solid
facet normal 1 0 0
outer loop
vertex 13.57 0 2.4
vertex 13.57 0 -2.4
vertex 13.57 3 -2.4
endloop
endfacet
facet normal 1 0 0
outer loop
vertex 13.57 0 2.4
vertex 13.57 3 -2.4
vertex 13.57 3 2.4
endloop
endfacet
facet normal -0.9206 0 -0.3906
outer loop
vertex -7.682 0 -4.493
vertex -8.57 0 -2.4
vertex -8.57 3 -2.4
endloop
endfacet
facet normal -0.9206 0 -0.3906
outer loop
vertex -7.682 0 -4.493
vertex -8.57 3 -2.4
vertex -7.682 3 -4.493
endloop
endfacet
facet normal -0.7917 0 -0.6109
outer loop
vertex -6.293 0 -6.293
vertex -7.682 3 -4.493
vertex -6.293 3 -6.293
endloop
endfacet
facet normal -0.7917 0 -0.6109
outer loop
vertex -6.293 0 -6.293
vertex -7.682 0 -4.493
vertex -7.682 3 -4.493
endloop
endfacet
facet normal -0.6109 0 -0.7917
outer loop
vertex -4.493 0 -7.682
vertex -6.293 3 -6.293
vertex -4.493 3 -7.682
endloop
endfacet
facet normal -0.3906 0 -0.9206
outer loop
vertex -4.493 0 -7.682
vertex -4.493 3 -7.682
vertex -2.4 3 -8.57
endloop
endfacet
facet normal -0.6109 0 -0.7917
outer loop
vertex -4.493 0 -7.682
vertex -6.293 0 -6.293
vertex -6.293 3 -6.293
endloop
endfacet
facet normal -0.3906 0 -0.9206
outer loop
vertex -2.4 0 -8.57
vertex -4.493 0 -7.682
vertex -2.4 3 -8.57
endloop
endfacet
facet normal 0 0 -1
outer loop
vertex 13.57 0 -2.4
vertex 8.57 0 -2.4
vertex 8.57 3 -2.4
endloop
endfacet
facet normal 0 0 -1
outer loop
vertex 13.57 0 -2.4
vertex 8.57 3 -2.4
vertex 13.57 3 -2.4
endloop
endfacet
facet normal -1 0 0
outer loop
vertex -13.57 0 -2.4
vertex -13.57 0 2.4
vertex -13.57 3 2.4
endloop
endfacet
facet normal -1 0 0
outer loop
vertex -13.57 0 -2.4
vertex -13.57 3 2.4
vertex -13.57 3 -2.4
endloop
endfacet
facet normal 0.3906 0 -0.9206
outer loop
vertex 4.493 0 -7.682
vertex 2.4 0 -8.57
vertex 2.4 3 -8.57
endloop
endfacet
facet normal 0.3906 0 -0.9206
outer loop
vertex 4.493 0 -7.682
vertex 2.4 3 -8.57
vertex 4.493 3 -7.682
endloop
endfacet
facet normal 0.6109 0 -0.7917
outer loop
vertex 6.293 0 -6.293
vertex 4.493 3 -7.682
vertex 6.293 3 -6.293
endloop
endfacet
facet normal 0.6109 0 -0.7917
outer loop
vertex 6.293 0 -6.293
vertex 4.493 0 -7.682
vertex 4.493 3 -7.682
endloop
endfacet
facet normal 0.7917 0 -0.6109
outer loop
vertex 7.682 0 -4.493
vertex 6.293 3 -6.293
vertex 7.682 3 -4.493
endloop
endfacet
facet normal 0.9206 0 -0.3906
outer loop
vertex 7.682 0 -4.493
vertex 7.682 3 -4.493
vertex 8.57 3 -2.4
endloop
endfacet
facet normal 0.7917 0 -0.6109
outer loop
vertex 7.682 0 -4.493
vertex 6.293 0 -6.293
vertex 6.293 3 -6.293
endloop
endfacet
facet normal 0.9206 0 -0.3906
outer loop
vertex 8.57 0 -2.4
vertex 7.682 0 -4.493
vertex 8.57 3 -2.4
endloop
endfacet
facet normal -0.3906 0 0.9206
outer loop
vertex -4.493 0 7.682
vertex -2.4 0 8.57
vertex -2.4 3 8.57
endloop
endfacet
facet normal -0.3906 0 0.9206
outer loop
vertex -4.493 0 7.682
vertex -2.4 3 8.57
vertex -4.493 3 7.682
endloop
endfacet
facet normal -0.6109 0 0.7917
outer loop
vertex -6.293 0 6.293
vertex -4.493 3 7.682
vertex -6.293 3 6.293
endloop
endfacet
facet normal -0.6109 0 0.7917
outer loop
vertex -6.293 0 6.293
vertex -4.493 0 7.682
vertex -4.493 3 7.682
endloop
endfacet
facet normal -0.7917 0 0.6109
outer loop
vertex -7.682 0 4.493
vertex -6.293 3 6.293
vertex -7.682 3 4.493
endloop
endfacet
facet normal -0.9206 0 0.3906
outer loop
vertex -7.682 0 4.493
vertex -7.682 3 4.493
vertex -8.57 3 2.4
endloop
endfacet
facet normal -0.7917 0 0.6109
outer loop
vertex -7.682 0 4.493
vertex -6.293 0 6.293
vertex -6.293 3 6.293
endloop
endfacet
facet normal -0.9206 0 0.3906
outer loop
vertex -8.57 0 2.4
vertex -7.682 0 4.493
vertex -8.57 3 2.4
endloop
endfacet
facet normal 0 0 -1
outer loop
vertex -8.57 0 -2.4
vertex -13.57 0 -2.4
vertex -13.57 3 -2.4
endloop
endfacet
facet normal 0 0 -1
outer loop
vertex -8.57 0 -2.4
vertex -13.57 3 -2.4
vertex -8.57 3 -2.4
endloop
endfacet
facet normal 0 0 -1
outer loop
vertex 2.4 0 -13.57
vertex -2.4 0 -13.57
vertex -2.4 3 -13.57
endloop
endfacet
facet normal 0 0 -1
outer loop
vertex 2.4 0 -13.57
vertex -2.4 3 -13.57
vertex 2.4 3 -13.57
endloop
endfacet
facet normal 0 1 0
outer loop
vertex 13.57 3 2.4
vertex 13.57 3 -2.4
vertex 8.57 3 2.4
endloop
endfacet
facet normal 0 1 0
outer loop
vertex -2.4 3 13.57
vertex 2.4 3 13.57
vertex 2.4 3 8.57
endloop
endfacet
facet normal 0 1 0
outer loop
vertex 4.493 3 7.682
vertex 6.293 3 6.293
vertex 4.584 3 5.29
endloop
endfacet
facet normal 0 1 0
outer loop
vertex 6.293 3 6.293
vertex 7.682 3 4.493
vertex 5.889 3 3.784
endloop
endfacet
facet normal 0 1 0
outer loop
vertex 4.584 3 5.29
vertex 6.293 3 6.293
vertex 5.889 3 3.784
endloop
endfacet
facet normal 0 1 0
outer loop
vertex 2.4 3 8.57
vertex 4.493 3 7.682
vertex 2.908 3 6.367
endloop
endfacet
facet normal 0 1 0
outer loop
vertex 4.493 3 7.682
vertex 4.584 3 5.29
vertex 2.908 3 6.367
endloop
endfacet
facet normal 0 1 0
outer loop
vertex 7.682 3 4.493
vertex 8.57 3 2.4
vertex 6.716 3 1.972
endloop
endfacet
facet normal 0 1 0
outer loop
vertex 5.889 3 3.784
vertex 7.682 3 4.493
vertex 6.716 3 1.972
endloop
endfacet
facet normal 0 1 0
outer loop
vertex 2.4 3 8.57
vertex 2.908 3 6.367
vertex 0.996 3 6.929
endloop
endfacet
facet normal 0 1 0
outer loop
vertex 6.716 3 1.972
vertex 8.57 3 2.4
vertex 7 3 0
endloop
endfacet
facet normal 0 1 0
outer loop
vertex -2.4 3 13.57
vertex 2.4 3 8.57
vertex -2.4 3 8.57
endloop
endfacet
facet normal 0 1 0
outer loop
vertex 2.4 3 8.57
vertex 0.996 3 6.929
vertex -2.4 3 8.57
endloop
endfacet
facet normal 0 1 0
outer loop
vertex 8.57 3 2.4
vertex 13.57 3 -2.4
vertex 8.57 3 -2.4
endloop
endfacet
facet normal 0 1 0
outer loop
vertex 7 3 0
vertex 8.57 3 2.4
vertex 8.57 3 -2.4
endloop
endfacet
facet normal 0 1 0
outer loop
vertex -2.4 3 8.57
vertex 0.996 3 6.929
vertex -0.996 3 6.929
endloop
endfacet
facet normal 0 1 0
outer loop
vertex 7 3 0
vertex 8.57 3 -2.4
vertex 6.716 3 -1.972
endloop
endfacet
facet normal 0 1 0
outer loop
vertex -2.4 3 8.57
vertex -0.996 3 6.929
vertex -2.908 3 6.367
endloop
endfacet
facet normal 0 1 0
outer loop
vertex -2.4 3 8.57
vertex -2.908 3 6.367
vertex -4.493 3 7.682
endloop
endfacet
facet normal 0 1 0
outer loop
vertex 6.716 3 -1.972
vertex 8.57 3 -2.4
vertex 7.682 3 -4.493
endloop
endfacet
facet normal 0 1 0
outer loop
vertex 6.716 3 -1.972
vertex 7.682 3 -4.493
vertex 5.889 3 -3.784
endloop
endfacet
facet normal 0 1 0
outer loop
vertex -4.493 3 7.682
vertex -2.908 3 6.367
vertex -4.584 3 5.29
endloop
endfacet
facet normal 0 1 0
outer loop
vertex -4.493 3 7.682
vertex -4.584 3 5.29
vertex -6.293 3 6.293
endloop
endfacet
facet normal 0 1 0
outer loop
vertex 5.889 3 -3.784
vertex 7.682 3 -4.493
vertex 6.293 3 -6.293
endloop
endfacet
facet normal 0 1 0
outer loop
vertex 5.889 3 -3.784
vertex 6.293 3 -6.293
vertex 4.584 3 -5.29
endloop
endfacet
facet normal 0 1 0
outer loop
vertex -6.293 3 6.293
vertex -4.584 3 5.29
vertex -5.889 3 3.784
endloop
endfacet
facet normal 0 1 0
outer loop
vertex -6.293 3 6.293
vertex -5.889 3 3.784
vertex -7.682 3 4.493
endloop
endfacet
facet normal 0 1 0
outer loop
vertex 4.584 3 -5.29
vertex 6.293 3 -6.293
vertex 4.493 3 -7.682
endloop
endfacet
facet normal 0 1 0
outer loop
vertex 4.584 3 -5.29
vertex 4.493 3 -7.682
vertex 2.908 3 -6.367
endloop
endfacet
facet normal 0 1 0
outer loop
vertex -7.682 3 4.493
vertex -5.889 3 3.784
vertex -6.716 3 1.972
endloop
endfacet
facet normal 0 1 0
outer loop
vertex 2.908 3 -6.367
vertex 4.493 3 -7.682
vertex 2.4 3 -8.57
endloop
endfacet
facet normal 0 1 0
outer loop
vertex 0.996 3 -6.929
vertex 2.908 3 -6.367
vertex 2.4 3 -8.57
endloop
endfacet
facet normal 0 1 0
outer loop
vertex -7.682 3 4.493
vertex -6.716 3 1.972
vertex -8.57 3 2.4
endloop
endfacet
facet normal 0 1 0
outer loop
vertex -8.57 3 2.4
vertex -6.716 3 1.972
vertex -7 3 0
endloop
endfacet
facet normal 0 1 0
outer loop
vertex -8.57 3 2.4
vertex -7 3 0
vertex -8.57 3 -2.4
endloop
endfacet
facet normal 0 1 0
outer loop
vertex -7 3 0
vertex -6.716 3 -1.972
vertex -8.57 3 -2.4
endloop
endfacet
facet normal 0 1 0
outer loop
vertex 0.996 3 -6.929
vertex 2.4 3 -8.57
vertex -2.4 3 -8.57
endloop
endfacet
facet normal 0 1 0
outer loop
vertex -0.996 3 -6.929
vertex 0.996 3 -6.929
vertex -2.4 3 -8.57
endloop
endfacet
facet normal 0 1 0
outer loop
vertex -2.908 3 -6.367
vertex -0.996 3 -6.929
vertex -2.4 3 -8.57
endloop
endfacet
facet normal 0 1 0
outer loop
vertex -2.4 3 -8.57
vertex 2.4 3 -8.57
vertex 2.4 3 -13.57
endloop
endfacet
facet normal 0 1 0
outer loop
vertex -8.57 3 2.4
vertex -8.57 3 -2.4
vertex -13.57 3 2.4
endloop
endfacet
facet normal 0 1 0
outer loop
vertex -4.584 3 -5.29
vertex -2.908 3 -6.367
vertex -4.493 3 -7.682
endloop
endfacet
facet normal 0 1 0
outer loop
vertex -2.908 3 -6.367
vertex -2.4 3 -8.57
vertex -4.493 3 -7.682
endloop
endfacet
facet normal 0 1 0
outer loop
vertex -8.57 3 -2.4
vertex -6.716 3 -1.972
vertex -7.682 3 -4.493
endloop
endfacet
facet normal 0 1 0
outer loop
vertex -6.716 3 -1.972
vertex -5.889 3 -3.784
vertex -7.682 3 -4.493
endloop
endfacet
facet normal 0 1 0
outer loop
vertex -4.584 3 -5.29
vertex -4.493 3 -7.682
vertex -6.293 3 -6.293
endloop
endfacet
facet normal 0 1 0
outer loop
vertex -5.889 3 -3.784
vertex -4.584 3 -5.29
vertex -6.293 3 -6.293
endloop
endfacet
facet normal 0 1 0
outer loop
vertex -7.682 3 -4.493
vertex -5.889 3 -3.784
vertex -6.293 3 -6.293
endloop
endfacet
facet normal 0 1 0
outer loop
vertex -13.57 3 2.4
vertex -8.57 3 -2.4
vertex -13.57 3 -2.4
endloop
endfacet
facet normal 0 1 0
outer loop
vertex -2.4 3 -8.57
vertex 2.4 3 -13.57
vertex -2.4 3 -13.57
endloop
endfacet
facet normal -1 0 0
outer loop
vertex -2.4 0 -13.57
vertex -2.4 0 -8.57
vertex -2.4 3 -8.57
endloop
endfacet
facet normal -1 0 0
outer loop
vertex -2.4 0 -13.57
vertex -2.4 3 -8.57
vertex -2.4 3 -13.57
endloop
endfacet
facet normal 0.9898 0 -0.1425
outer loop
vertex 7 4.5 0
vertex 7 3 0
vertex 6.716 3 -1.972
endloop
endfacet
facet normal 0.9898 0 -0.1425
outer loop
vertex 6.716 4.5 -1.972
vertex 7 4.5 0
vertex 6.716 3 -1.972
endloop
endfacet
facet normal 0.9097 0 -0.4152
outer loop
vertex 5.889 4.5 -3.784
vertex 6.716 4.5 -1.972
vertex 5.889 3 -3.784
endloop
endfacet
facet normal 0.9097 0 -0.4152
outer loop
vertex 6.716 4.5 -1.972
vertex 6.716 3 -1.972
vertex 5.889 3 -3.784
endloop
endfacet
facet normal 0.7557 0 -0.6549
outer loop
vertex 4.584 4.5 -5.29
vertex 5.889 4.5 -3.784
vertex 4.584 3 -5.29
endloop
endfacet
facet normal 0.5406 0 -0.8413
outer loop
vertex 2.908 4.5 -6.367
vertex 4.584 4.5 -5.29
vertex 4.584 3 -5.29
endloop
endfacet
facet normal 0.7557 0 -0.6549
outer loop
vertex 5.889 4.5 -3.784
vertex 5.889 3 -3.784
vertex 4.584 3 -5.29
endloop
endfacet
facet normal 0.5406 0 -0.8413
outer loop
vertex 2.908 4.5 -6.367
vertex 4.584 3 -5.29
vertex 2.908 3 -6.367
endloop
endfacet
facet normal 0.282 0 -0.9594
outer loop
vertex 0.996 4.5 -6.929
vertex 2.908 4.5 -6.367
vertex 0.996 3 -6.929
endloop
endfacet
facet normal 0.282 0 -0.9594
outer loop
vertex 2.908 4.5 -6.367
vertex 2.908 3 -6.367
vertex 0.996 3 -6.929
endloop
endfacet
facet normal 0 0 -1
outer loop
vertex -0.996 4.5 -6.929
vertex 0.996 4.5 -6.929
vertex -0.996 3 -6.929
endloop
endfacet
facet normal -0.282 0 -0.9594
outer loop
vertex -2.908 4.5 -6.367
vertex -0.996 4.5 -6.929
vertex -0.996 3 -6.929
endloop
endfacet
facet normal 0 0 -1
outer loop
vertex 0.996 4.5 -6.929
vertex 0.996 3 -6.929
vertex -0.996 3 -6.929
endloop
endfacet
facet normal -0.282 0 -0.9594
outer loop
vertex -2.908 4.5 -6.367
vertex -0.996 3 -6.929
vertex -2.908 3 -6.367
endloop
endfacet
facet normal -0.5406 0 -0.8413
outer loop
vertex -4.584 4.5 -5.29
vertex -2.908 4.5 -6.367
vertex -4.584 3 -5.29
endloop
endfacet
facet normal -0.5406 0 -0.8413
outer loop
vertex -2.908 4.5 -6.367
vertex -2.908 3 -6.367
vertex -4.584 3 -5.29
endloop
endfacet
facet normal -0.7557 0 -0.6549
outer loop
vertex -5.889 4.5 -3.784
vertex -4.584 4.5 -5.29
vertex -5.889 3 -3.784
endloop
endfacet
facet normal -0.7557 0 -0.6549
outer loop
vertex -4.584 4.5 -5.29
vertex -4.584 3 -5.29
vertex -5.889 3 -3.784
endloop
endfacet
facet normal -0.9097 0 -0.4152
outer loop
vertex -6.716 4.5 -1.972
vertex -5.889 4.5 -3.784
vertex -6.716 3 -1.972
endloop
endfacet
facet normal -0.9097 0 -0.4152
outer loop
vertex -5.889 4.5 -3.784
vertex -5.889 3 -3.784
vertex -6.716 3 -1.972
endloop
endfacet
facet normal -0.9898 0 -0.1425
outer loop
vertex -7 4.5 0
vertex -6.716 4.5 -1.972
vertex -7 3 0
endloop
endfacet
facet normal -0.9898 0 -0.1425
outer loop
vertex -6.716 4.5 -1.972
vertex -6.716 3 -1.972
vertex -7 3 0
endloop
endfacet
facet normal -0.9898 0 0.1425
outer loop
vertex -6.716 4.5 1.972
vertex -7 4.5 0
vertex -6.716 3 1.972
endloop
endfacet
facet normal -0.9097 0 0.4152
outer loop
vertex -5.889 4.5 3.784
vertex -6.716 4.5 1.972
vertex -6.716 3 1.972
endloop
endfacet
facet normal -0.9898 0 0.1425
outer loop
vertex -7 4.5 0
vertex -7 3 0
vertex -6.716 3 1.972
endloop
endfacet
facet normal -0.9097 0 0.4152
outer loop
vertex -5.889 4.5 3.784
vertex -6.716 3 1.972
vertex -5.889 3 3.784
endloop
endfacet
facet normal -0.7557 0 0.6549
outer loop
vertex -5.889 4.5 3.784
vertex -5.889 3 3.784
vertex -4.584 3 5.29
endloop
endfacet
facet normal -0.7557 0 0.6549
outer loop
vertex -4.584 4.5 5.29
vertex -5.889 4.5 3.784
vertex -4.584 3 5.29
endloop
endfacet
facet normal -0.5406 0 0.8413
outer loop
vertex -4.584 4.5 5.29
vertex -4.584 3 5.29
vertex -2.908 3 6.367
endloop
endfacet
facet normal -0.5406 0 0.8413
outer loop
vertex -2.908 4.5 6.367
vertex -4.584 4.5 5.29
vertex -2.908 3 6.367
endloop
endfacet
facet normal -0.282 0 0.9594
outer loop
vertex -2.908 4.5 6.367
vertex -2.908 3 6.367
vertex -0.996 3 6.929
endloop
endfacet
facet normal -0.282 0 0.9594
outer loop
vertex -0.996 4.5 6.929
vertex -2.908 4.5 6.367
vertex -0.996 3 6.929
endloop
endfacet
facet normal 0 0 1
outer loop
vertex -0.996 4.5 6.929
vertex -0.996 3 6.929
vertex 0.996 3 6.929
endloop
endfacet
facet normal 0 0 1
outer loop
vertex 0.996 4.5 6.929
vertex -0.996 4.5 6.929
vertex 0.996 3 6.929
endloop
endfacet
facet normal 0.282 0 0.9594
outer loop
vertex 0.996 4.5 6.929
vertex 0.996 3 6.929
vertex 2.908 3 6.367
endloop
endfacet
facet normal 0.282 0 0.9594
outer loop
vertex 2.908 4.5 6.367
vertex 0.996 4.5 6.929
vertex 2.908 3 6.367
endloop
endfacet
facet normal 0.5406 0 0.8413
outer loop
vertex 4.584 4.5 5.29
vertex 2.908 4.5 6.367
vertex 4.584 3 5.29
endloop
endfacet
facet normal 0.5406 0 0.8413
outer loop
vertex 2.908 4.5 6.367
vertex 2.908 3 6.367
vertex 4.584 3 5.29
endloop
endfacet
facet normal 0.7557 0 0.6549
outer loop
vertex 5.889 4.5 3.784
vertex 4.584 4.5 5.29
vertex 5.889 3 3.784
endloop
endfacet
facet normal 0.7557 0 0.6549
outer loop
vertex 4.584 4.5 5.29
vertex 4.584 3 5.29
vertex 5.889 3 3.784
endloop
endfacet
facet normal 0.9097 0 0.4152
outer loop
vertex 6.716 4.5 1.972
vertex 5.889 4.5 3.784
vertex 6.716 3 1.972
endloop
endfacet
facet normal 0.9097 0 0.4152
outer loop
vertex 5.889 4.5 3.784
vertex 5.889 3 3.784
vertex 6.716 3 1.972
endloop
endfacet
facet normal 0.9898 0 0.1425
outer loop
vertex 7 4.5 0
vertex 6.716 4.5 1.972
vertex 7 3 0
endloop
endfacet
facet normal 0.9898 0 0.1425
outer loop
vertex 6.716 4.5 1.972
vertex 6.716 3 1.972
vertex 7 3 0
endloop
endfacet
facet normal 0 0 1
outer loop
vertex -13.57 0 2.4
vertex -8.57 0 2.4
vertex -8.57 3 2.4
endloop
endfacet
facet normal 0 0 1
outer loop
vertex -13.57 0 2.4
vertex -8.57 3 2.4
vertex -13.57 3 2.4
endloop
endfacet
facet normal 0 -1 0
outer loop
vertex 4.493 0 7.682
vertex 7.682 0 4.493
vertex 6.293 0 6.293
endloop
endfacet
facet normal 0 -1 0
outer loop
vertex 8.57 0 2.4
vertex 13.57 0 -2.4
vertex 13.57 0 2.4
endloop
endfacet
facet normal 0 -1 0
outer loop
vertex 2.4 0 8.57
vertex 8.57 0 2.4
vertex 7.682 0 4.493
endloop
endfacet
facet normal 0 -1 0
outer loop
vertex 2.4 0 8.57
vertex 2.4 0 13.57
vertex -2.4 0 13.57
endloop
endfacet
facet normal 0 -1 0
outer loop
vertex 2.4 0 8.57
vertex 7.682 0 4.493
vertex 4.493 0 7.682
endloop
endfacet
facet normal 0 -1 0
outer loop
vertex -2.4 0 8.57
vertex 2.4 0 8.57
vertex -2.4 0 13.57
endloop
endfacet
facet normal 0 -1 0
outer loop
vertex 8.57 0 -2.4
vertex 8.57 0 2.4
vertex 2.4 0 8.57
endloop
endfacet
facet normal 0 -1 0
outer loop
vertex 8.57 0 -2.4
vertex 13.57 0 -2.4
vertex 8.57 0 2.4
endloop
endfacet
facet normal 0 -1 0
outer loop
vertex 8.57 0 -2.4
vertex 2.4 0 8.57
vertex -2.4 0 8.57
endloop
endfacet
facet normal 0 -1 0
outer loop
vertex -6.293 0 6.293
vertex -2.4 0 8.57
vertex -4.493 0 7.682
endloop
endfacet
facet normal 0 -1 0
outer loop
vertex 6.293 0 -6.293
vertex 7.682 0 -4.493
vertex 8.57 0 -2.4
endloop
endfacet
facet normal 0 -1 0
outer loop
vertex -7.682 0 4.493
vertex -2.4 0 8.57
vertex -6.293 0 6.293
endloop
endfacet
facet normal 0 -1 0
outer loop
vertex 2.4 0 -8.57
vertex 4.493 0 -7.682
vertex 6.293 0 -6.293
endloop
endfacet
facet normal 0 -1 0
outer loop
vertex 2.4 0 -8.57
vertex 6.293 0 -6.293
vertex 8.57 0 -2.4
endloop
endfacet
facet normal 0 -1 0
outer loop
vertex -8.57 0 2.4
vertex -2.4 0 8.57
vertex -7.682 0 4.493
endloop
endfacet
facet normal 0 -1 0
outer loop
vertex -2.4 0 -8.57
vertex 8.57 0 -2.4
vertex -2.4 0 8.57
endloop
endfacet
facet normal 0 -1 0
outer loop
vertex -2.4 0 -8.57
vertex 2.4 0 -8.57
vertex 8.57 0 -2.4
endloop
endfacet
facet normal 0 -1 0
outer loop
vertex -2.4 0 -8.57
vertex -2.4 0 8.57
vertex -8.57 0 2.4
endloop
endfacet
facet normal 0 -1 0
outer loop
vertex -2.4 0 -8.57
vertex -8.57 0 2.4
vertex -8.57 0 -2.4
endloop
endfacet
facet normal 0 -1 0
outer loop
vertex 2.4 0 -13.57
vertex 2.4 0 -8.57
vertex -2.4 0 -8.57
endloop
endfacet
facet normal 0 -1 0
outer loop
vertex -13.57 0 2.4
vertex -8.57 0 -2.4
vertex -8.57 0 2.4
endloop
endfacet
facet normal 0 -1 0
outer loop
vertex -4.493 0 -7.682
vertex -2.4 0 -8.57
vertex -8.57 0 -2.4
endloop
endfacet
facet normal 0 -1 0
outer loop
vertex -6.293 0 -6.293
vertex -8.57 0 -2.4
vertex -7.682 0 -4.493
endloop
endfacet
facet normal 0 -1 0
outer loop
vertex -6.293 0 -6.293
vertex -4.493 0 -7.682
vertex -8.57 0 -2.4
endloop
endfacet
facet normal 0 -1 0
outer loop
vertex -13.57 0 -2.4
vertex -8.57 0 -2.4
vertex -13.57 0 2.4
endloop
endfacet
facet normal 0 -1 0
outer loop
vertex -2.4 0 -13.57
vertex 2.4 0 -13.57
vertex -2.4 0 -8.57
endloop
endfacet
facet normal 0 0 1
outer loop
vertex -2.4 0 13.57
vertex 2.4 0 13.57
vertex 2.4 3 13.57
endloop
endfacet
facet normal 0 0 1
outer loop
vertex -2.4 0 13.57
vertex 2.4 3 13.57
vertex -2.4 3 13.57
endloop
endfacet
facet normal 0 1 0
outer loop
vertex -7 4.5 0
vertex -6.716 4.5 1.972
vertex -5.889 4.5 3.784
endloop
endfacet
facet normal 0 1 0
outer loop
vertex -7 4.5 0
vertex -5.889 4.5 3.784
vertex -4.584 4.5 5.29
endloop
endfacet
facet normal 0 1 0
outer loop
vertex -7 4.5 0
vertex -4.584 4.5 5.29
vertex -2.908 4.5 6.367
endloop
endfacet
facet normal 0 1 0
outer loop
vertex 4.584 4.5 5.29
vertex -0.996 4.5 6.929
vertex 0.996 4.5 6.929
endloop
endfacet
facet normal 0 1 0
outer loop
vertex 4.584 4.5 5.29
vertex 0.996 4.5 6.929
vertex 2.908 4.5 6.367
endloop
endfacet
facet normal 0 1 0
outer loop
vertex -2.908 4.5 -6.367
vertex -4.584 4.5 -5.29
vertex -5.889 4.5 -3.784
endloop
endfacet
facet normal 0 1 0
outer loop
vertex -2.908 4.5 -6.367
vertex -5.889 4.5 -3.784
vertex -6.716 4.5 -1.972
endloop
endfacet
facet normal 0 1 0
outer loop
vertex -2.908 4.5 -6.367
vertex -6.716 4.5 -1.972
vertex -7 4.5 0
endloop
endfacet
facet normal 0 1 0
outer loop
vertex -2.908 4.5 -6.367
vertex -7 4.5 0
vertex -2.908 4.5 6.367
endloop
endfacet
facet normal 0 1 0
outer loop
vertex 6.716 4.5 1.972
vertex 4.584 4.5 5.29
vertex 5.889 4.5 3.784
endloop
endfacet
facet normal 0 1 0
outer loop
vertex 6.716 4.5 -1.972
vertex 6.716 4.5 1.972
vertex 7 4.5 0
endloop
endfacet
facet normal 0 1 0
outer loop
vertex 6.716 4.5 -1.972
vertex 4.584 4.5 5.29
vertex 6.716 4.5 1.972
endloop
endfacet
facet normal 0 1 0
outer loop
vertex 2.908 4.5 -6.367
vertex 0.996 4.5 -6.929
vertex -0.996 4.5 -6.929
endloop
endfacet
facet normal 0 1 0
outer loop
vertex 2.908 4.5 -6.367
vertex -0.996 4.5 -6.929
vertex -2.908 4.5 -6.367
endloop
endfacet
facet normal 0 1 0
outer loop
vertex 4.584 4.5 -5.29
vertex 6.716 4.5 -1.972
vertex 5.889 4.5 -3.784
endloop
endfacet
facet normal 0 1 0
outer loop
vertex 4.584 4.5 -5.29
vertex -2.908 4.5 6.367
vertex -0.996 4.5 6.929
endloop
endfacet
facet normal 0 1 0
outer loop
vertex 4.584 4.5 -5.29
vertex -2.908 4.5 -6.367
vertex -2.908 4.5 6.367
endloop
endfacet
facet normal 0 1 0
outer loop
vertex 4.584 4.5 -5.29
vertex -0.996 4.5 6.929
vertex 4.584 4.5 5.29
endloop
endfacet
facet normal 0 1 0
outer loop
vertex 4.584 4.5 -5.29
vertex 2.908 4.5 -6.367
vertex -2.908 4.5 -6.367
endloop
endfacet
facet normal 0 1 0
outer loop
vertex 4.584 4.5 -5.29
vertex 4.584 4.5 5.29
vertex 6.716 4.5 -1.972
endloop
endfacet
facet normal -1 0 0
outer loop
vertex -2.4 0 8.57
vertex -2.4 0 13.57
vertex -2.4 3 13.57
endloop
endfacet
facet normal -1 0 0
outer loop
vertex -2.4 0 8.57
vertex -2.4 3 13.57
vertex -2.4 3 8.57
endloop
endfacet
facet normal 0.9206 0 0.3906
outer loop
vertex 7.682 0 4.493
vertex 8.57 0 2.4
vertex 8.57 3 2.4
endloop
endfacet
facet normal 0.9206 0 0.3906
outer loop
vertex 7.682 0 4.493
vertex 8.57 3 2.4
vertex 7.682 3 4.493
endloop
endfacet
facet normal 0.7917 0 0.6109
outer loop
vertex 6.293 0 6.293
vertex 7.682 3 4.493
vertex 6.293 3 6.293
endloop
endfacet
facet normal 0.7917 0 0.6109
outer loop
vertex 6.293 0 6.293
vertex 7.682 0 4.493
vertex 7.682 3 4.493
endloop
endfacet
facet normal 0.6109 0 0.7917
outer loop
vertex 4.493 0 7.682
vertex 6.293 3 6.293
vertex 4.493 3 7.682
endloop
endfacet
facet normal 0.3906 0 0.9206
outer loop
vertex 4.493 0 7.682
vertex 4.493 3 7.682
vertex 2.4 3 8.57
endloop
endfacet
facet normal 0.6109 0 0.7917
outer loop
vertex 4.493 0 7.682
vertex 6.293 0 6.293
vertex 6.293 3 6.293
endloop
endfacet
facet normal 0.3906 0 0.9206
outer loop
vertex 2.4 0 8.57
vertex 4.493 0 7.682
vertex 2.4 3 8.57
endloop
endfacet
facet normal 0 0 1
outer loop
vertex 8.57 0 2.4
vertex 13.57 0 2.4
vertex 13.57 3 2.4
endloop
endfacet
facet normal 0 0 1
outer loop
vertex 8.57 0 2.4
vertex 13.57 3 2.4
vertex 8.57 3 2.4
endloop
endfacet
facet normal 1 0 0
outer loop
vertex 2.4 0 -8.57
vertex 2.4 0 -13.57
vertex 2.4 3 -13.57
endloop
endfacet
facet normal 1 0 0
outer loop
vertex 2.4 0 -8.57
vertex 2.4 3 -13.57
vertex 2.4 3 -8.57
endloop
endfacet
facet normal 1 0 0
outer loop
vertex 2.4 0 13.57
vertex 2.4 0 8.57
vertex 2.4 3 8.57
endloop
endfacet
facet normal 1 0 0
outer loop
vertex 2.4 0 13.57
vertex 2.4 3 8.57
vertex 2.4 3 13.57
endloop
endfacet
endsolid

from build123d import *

# Parameters (mm, degrees)
EXTRUDE_1_DEPTH = 3
SKETCH_2_R      = 7
EXTRUDE_2_DEPTH = 1.5


with BuildPart() as part:
    # 草图1 → 凸台-拉伸1 (new body)
    with BuildSketch(Plane(origin=(0, 0, 0), x_dir=(1, 0, 0), z_dir=(0, 1, 0))):
        with BuildLine():
            Line((-13.570297544, 2.4), (-8.570297544, 2.4))
            ThreePointArc((-8.570297544, 2.4), (-6.293250353, 6.293250353), (-2.4, 8.570297544))
            Line((-2.4, 8.570297544), (-2.4, 13.570297544))
            Line((-2.4, 13.570297544), (2.4, 13.570297544))
            Line((2.4, 13.570297544), (2.4, 8.570297544))
            ThreePointArc((2.4, 8.570297544), (6.293250353, 6.293250353), (8.570297544, 2.4))
            Line((8.570297544, 2.4), (13.570297544, 2.4))
            Line((13.570297544, 2.4), (13.570297544, -2.4))
            Line((13.570297544, -2.4), (8.570297544, -2.4))
            ThreePointArc((8.570297544, -2.4), (6.293250353, -6.293250353), (2.4, -8.570297544))
            Line((2.4, -8.570297544), (2.4, -13.570297544))
            Line((2.4, -13.570297544), (-2.4, -13.570297544))
            Line((-2.4, -13.570297544), (-2.4, -8.570297544))
            ThreePointArc((-2.4, -8.570297544), (-6.293250353, -6.293250353), (-8.570297544, -2.4))
            Line((-8.570297544, -2.4), (-13.570297544, -2.4))
            Line((-13.570297544, -2.4), (-13.570297544, 2.4))
        make_face()
    extrude(amount=EXTRUDE_1_DEPTH)

    # 草图2 → 凸台-拉伸2 (add)
    with BuildSketch(Plane(origin=(0, 3, 0), x_dir=(1, 0, 0), z_dir=(0, 1, 0))):
        Circle(SKETCH_2_R)
    extrude(amount=EXTRUDE_2_DEPTH)


solid = part.part
